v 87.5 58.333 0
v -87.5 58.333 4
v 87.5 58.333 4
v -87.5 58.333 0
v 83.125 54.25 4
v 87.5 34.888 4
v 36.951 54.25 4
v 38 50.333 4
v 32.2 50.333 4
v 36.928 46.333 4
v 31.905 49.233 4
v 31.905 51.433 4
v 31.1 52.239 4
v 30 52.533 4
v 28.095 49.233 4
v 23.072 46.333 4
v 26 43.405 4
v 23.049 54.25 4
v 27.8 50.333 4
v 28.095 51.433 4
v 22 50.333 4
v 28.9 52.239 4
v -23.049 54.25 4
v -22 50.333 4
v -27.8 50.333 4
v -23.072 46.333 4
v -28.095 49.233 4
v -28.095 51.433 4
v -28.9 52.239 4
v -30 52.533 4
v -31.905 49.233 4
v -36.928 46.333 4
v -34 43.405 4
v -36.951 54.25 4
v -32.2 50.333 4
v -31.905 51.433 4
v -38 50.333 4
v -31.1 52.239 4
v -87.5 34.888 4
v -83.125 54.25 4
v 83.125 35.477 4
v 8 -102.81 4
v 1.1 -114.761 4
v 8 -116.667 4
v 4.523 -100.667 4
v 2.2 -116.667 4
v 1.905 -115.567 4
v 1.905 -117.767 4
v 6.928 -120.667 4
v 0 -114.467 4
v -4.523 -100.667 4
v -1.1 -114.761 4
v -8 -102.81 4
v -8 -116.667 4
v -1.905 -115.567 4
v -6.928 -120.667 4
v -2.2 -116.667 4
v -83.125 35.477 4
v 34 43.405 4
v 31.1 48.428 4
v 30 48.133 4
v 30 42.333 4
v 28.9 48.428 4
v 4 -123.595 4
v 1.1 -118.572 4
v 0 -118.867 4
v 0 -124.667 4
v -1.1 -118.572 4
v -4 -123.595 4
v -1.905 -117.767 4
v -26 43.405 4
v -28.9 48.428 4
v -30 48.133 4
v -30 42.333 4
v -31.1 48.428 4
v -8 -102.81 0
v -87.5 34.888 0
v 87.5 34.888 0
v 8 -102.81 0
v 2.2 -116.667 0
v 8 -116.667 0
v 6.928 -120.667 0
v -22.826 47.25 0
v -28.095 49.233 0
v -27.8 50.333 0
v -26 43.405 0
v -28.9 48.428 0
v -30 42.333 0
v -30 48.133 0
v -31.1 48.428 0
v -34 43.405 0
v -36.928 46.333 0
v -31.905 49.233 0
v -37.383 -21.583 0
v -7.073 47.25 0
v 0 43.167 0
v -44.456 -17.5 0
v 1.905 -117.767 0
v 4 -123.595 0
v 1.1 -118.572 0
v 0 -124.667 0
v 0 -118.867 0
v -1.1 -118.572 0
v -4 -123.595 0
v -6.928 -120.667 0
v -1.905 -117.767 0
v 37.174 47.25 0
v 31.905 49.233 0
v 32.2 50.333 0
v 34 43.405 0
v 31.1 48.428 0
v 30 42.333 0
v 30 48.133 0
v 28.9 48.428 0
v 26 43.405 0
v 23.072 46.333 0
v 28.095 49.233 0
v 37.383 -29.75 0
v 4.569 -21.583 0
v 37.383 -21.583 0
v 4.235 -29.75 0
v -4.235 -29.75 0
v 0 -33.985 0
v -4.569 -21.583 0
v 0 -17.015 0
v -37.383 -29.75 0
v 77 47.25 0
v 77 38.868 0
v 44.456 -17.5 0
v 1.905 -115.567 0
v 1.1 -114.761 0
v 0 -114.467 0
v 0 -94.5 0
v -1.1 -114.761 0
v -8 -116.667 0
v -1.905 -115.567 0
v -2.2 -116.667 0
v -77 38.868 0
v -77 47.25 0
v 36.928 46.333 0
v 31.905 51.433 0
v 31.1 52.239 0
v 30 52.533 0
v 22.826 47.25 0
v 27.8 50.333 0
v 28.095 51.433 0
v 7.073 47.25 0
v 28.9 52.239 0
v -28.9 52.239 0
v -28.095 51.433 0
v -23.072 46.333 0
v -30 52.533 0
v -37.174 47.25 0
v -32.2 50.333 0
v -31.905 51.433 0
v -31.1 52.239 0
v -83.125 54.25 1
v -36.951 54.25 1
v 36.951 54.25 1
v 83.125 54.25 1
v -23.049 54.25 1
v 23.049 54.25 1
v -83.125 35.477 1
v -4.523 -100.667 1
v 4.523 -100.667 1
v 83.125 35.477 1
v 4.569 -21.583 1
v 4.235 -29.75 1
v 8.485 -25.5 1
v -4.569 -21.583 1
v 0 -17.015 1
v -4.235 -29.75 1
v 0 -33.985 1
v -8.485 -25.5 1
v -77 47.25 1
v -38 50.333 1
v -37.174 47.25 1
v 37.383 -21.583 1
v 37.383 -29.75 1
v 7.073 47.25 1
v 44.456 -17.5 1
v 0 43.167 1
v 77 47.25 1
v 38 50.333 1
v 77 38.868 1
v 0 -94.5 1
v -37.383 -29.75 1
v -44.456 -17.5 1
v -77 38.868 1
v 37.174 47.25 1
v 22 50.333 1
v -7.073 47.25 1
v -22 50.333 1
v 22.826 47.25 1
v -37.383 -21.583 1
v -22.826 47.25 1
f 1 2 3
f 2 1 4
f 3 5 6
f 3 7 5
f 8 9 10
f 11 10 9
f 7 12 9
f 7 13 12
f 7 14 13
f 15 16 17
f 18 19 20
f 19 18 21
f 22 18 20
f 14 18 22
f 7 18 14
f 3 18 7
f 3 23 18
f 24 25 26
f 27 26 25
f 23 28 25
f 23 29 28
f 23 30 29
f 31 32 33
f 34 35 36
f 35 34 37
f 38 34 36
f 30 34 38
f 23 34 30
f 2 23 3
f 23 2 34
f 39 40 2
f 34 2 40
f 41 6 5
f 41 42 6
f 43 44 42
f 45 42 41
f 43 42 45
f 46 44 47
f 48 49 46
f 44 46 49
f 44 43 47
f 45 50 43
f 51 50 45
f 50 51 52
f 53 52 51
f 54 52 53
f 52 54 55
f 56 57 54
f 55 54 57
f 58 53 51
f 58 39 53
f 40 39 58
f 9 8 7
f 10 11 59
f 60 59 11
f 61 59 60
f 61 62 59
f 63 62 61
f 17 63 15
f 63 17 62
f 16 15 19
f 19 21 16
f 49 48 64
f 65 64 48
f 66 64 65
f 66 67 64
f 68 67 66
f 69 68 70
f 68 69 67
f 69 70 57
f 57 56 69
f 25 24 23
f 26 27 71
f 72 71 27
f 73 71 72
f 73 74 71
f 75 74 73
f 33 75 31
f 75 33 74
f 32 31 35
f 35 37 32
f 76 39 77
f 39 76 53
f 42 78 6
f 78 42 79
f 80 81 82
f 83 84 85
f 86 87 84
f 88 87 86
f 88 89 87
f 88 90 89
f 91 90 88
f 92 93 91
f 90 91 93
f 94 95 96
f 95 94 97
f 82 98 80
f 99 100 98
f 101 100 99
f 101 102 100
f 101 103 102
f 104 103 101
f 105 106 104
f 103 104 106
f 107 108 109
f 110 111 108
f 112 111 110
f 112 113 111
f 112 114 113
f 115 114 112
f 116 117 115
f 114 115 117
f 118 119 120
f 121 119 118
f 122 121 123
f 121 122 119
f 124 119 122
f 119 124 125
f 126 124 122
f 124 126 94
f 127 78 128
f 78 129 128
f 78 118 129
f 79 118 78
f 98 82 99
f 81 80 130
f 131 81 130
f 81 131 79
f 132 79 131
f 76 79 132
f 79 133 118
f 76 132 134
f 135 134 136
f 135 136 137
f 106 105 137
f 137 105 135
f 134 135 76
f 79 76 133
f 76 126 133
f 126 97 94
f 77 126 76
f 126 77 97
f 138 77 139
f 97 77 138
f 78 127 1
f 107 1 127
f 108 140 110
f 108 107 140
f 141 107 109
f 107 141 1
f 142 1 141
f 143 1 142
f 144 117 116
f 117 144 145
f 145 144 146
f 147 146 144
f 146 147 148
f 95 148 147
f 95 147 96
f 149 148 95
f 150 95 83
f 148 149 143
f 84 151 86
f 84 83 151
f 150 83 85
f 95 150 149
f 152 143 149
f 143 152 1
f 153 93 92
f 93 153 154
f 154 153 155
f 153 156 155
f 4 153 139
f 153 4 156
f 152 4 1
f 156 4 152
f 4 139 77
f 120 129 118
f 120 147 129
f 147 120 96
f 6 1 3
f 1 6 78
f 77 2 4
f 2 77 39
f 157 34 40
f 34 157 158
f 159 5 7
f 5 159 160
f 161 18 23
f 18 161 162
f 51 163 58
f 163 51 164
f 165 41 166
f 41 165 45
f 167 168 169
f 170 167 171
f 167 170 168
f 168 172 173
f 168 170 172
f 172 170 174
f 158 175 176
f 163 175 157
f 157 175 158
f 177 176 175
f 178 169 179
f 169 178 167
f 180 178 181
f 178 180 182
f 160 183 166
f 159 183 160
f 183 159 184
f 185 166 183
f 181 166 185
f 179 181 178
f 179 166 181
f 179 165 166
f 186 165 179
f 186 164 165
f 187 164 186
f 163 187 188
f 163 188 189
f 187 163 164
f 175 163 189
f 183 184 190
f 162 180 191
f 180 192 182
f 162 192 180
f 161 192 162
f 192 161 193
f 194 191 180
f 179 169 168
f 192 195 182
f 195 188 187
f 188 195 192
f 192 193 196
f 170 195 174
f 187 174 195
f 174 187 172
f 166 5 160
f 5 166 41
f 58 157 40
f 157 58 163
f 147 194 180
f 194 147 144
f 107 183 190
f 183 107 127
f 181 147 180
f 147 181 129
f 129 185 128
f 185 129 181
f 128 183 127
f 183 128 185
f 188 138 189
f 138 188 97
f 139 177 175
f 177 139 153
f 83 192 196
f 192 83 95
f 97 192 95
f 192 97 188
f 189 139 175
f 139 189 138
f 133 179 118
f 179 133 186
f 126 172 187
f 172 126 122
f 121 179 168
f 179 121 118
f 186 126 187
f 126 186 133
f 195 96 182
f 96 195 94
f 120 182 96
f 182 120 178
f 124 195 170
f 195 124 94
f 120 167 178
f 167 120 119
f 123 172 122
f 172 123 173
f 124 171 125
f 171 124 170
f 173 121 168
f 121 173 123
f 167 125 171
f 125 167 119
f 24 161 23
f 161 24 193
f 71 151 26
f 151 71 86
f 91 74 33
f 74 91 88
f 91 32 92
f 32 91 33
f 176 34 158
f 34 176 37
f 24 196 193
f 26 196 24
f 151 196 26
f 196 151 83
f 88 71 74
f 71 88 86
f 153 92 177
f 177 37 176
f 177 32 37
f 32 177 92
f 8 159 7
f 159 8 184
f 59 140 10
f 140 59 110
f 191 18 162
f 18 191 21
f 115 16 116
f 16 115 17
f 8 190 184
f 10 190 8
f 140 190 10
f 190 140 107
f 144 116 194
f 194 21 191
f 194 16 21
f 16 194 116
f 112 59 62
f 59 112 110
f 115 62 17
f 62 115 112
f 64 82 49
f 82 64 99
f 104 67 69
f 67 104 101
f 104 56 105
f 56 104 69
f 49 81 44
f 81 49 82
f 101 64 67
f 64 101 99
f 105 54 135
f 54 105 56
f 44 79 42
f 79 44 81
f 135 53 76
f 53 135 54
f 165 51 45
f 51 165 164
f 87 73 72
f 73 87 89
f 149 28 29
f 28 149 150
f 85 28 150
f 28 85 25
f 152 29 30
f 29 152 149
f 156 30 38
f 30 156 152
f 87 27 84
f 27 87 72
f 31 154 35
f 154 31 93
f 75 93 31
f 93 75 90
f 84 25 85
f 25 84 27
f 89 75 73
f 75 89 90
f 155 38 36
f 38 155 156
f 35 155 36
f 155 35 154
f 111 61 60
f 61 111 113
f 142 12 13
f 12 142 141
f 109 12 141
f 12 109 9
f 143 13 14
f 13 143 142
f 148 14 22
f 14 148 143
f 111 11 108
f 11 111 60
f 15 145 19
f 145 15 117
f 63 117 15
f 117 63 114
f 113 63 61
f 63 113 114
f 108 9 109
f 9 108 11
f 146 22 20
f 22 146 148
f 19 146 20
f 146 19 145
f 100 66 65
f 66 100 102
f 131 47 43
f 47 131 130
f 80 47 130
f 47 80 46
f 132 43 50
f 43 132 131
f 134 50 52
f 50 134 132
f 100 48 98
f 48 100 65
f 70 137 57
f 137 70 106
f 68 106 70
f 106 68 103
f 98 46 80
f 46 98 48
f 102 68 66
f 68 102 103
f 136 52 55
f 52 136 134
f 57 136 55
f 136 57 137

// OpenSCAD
radius = 175; // pretty close to 150/cos(30)
radius2 = radius/cos(30);
radius3 = radius2/cos(30)/2;
radius4 = radius3*0.37;
h=4;

module jig() {
  difference() {
    union() {
      difference() {
	intersection() {
	  rotate([0, 0, 30])
	    cylinder(r=radius3, h=h, center=true, $fn=3);
	  cube([radius, 300, 20], center=true);
	}
	intersection() {
	  rotate([0, 0, 30]) translate([0, 0, 1])
	    cylinder(r=radius3*0.93, h=h, center=true, $fn=3);
	  cube([radius*0.95, 300, 20], center=true);
	}
	for (a = [0:120:360]) {
	  intersection() {
	    rotate([0, 0, a+30]) translate([radius3*0.44, 0, 0])
	      cylinder(r=radius4, h=h+1, center=true, $fn=3);
	    cube([radius*0.88, 300, 20], center=true);
	  }
	}
	rotate([0, 0, -30])
	  cylinder(r=radius4, h=h+1, center=true, $fn=3);
      }
      translate([0, -25.5, 0.5-h/2]) rotate([0, 0, 45])
	cube([12, 12, 1], center=true);
      translate([-30, radius3/2-8, 0])
	cylinder(r=8, h=h, center=true, $fn=12);
      translate([30, radius3/2-8, 0])
	cylinder(r=8, h=h, center=true, $fn=12);
      translate([0, -radius3, 0])
	cylinder(r=8, h=h, center=true, $fn=12);
      translate([0, 8-radius3, 0])
	cube([16, 16, h], center=true);
    }
    translate([-30, radius3/2-8, 0])
      # cylinder(r=2.2, h=50, center=true, $fn=12);
    translate([30, radius3/2-8, 0])
      # cylinder(r=2.2, h=50, center=true, $fn=12);
    translate([0, -radius3, 0])
      # cylinder(r=2.2, h=50, center=true, $fn=12);
  }
}

translate([0, 0, h/2]) jig();
